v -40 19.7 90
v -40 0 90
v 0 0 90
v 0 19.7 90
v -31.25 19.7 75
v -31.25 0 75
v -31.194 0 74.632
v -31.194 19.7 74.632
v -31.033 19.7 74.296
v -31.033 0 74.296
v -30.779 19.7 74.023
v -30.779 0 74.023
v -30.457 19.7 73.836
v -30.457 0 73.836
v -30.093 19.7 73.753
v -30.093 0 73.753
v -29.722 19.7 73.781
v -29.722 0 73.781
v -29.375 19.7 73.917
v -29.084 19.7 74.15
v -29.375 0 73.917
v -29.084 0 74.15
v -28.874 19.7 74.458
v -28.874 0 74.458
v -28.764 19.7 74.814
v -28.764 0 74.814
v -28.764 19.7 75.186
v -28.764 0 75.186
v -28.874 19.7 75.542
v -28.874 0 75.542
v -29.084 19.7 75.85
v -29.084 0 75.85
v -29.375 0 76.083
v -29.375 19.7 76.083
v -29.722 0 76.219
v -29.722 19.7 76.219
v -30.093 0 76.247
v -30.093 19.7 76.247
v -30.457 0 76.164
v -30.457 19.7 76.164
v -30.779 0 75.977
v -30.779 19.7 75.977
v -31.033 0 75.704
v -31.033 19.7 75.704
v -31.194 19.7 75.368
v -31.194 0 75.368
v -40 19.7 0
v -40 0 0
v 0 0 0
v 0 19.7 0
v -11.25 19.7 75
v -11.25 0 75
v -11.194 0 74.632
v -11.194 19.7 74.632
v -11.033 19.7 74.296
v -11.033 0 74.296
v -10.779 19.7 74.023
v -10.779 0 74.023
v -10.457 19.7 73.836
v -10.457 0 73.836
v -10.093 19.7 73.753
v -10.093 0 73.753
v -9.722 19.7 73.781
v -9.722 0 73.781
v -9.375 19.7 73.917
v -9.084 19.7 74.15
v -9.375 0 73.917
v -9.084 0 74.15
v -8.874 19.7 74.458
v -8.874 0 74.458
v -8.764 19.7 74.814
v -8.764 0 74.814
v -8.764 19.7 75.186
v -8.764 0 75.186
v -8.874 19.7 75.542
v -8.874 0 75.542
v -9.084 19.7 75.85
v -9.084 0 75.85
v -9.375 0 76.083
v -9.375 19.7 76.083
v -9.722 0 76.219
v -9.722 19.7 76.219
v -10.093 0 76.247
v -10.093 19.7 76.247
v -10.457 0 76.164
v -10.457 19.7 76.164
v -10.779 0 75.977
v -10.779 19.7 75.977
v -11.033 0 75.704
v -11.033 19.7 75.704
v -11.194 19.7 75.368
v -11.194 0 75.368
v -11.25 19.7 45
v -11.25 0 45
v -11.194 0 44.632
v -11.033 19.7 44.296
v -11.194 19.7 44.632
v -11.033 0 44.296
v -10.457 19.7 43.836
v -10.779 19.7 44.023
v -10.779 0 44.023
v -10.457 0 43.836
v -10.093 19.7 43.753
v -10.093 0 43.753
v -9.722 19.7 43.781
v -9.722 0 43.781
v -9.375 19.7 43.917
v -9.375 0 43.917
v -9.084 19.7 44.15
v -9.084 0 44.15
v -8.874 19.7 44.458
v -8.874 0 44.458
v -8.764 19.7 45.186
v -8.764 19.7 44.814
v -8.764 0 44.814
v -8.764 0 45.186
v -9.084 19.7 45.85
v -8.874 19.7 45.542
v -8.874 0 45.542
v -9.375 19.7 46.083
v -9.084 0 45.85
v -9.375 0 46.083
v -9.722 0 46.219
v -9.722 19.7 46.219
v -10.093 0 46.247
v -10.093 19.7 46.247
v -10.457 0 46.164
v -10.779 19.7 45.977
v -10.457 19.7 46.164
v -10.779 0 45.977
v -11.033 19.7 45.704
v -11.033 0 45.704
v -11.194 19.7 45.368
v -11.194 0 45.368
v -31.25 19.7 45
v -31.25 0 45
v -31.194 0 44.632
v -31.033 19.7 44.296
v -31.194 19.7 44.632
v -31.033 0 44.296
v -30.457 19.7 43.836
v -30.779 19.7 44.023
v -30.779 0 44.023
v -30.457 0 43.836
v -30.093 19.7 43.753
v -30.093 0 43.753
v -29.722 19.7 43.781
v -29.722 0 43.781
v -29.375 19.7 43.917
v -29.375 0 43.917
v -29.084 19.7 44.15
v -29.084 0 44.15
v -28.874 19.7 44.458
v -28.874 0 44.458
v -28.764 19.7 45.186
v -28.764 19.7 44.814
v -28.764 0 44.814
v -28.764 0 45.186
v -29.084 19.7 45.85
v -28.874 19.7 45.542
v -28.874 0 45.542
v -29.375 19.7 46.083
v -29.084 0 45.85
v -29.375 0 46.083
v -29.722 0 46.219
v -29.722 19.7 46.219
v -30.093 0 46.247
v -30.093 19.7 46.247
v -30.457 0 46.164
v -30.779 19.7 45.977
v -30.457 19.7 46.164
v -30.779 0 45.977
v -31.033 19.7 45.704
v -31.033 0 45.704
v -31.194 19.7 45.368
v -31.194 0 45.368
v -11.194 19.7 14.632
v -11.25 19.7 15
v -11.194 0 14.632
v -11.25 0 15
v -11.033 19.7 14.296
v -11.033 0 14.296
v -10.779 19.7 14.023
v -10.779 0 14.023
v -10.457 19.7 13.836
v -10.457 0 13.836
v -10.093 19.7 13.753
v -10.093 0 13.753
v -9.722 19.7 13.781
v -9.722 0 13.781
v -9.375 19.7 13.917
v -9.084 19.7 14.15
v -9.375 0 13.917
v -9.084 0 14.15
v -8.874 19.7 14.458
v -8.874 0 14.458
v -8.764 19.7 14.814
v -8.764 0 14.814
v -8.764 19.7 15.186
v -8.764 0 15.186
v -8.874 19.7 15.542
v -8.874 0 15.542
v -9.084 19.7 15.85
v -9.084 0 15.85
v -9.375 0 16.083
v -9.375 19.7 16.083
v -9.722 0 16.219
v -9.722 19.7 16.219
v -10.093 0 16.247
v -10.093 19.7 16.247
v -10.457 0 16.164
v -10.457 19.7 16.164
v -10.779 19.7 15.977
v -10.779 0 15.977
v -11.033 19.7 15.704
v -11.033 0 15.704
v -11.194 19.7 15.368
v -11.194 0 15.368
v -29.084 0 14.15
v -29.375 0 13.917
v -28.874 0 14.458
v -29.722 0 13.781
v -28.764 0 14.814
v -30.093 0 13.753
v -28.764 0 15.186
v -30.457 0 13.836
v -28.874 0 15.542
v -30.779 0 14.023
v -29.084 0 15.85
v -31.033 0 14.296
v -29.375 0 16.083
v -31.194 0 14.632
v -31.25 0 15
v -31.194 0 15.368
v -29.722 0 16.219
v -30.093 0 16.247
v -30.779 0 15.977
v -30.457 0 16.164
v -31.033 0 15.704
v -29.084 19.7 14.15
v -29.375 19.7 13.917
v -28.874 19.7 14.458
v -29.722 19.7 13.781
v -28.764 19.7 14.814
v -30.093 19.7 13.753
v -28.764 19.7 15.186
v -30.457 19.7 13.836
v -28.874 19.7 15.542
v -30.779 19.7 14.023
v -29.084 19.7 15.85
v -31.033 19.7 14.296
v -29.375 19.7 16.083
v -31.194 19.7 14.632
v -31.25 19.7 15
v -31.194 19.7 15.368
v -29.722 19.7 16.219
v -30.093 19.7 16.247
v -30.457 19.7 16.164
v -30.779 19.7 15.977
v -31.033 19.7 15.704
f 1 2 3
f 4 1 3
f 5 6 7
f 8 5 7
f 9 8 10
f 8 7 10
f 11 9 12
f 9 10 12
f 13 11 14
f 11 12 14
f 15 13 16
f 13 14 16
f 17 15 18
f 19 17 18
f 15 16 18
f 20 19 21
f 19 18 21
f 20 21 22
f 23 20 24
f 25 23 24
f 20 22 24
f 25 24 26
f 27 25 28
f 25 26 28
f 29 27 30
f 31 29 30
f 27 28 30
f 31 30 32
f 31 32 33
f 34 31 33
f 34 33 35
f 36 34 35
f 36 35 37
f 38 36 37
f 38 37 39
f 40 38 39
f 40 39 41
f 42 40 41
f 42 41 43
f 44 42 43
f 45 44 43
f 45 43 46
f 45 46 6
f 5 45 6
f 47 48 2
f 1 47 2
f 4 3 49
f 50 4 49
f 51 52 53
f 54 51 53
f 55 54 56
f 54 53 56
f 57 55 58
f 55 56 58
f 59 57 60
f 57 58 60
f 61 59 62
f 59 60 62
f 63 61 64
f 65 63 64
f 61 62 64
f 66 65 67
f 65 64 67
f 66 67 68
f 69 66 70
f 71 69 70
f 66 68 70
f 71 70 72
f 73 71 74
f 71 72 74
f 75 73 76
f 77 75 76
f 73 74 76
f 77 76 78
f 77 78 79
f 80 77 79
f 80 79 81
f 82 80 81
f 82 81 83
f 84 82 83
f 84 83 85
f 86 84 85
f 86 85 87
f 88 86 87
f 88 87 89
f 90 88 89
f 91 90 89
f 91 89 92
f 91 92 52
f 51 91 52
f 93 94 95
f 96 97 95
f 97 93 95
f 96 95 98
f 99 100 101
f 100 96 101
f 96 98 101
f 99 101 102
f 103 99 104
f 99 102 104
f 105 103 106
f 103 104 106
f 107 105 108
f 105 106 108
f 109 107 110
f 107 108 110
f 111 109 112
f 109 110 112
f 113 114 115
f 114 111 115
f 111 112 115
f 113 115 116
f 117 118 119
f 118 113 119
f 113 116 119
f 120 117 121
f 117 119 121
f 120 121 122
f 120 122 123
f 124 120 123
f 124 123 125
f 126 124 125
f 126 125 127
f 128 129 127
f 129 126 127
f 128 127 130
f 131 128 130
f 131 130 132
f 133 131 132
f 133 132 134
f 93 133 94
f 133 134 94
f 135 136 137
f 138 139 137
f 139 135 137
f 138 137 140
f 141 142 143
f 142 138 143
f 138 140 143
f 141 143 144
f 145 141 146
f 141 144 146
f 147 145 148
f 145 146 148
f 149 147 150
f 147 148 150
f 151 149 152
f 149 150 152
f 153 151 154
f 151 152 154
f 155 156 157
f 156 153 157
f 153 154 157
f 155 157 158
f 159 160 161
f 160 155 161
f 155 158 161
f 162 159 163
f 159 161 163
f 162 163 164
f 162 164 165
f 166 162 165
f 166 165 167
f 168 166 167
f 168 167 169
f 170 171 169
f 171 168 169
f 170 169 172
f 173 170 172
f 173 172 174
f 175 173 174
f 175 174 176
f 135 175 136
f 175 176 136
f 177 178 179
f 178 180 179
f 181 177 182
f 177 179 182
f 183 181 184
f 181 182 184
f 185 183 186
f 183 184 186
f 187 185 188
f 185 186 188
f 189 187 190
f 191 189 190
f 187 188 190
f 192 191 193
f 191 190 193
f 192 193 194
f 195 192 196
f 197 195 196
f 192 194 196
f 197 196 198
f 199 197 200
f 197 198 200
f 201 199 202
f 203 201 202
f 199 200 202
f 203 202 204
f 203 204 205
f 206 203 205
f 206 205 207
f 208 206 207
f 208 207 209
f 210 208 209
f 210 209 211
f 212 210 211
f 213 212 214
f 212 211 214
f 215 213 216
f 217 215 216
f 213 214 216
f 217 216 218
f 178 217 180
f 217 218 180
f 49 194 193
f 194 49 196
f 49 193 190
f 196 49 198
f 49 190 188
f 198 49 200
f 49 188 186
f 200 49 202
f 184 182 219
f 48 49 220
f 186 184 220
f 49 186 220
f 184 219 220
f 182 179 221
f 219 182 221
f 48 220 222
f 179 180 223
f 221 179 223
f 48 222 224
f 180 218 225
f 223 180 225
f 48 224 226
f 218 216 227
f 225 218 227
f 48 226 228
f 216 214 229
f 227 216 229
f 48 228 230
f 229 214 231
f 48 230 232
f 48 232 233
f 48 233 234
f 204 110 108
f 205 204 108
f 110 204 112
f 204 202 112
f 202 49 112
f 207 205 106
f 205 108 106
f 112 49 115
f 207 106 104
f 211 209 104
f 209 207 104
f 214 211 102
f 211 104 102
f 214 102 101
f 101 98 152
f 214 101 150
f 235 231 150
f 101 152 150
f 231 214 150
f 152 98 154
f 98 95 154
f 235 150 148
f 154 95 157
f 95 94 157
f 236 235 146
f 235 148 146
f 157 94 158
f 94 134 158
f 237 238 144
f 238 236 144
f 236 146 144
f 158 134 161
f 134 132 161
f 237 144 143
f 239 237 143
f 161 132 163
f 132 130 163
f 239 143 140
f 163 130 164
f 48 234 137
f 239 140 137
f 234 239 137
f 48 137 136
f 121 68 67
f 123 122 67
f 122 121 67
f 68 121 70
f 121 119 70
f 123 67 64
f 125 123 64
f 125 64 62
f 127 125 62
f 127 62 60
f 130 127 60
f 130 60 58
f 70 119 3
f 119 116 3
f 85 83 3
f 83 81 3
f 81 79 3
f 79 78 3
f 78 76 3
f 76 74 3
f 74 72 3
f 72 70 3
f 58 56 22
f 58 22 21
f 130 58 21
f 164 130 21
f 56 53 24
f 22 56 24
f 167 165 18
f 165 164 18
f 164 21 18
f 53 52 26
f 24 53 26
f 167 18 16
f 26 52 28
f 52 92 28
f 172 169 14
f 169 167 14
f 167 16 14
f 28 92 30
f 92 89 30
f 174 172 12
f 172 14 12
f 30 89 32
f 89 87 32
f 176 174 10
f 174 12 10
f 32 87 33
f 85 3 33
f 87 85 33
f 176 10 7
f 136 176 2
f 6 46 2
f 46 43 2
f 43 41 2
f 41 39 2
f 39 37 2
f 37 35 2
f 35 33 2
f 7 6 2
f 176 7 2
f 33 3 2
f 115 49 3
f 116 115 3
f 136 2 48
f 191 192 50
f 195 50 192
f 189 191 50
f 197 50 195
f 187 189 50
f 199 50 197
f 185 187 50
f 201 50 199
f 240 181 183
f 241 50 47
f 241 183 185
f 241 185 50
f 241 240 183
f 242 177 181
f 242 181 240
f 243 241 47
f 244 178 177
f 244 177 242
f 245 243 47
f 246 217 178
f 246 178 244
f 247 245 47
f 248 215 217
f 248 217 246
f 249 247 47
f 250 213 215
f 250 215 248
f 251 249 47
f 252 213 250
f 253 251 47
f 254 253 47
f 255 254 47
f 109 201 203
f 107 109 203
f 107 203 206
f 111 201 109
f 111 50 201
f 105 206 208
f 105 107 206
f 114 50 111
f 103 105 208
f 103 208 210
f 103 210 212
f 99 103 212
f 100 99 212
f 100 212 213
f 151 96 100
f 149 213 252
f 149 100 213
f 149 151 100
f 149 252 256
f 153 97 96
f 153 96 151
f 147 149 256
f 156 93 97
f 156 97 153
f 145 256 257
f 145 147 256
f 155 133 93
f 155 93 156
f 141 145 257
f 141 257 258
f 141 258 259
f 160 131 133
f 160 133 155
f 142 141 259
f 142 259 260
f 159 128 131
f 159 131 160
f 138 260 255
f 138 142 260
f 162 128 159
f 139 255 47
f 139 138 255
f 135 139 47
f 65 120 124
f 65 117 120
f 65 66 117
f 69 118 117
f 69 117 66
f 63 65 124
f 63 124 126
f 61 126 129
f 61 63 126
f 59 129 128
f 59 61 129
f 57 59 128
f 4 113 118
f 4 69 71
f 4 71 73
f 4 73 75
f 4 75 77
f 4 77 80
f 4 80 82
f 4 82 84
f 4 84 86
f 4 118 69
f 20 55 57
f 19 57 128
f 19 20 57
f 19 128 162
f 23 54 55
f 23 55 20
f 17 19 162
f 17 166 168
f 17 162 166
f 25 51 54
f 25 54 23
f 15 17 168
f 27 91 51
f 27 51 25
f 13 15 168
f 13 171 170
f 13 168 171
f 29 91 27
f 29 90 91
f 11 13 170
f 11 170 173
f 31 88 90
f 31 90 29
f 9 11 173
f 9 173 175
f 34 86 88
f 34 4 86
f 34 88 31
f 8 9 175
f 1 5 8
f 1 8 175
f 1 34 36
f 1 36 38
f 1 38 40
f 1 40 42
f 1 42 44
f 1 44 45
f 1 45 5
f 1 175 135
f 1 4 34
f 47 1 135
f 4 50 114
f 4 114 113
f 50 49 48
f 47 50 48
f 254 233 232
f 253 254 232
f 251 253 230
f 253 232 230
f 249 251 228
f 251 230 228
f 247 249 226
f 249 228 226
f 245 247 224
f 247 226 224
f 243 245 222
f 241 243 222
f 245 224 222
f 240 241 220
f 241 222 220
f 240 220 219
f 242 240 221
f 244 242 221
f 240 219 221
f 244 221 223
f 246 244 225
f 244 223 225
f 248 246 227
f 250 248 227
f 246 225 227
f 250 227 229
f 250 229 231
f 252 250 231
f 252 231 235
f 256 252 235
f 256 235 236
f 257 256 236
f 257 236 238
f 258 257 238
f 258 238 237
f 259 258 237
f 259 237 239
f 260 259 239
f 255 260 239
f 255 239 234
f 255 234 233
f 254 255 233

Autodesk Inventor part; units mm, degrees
ref_plane "YZ Plane" through (0, 0, 0) normal (1, 0, 0) x (0, 1, 0)
ref_plane "XZ Plane" through (0, 0, 0) normal (0, 1, 0) x (-1, 0, 0)
ref_plane "XY Plane" through (0, 0, 0) normal (0, 0, 1) x (1, 0, 0)
sketch "スケッチ1" plane through (0, 0, 0) normal (0, 1, 0) x (-1, 0, 0)
  line L0 (0, 0) -> (40, 0)
  line L1 (40, 0) -> (40, 90)
  line L2 (40, 90) -> (0, 90)
  line L3 (0, 90) -> (0, 0)
  line L4 (0, 90) -> (10, 90)
  line L5 (10, 90) -> (10, 76.25)
  line L6 (10, 75) -> (0, 75)
  line L7 (0, 75) -> (0, 90)
  line L8 (40, 90) -> (30, 90)
  line L9 (30, 90) -> (30, 76.25)
  line L10 (30, 75) -> (40, 75)
  line L11 (40, 75) -> (40, 90)
  line L12 (0, 0) -> (10, 0)
  line L13 (10, 0) -> (10, 13.75)
  line L14 (10, 15) -> (0, 15)
  line L15 (0, 15) -> (0, 0)
  line L16 (40, 0) -> (30, 0)
  line L17 (30, 0) -> (30, 13.75)
  line L18 (30, 15) -> (40, 15)
  line L19 (40, 15) -> (40, 0)
  circle A0 centre (10, 75) radius 1.25
  circle A1 centre (30, 75) radius 1.25
  circle A2 centre (10, 45) radius 1.25
  circle A3 centre (30, 45) radius 1.25
  circle A4 centre (10, 15) radius 1.25
  circle A5 centre (30, 15) radius 1.25
  dimension "d10" = 2.5
  dimension "d11" = 2.5
  dimension "d14" = 2.5
  dimension "d15" = 2.5
  dimension "d0" = 40
  dimension "d1" = 90
  dimension "d2" = 10
  dimension "d3" = 15
  dimension "d4" = 10
  dimension "d5" = 15
  dimension "d6" = 10
  dimension "d7" = 15
  dimension "d8" = 10
  dimension "d9" = 15
  dimension "d12" = 2.5
  dimension "d13" = 2.5
extrude "押し出し1" add sketch "スケッチ1" along normal blind 19.7 contours L3 L14 A4 L13 L0 | L13 A4 L14 L3 L6 A0 L5 L2 L9 A1 L10 L1 L18 A5 L17 L0 | L17 A5 L18 L1 L0 | L3 L2 L5 A0 L6 | L10 A1 L9 L2 L1
properties part number "知能ロボコンスペーサ1.1"
